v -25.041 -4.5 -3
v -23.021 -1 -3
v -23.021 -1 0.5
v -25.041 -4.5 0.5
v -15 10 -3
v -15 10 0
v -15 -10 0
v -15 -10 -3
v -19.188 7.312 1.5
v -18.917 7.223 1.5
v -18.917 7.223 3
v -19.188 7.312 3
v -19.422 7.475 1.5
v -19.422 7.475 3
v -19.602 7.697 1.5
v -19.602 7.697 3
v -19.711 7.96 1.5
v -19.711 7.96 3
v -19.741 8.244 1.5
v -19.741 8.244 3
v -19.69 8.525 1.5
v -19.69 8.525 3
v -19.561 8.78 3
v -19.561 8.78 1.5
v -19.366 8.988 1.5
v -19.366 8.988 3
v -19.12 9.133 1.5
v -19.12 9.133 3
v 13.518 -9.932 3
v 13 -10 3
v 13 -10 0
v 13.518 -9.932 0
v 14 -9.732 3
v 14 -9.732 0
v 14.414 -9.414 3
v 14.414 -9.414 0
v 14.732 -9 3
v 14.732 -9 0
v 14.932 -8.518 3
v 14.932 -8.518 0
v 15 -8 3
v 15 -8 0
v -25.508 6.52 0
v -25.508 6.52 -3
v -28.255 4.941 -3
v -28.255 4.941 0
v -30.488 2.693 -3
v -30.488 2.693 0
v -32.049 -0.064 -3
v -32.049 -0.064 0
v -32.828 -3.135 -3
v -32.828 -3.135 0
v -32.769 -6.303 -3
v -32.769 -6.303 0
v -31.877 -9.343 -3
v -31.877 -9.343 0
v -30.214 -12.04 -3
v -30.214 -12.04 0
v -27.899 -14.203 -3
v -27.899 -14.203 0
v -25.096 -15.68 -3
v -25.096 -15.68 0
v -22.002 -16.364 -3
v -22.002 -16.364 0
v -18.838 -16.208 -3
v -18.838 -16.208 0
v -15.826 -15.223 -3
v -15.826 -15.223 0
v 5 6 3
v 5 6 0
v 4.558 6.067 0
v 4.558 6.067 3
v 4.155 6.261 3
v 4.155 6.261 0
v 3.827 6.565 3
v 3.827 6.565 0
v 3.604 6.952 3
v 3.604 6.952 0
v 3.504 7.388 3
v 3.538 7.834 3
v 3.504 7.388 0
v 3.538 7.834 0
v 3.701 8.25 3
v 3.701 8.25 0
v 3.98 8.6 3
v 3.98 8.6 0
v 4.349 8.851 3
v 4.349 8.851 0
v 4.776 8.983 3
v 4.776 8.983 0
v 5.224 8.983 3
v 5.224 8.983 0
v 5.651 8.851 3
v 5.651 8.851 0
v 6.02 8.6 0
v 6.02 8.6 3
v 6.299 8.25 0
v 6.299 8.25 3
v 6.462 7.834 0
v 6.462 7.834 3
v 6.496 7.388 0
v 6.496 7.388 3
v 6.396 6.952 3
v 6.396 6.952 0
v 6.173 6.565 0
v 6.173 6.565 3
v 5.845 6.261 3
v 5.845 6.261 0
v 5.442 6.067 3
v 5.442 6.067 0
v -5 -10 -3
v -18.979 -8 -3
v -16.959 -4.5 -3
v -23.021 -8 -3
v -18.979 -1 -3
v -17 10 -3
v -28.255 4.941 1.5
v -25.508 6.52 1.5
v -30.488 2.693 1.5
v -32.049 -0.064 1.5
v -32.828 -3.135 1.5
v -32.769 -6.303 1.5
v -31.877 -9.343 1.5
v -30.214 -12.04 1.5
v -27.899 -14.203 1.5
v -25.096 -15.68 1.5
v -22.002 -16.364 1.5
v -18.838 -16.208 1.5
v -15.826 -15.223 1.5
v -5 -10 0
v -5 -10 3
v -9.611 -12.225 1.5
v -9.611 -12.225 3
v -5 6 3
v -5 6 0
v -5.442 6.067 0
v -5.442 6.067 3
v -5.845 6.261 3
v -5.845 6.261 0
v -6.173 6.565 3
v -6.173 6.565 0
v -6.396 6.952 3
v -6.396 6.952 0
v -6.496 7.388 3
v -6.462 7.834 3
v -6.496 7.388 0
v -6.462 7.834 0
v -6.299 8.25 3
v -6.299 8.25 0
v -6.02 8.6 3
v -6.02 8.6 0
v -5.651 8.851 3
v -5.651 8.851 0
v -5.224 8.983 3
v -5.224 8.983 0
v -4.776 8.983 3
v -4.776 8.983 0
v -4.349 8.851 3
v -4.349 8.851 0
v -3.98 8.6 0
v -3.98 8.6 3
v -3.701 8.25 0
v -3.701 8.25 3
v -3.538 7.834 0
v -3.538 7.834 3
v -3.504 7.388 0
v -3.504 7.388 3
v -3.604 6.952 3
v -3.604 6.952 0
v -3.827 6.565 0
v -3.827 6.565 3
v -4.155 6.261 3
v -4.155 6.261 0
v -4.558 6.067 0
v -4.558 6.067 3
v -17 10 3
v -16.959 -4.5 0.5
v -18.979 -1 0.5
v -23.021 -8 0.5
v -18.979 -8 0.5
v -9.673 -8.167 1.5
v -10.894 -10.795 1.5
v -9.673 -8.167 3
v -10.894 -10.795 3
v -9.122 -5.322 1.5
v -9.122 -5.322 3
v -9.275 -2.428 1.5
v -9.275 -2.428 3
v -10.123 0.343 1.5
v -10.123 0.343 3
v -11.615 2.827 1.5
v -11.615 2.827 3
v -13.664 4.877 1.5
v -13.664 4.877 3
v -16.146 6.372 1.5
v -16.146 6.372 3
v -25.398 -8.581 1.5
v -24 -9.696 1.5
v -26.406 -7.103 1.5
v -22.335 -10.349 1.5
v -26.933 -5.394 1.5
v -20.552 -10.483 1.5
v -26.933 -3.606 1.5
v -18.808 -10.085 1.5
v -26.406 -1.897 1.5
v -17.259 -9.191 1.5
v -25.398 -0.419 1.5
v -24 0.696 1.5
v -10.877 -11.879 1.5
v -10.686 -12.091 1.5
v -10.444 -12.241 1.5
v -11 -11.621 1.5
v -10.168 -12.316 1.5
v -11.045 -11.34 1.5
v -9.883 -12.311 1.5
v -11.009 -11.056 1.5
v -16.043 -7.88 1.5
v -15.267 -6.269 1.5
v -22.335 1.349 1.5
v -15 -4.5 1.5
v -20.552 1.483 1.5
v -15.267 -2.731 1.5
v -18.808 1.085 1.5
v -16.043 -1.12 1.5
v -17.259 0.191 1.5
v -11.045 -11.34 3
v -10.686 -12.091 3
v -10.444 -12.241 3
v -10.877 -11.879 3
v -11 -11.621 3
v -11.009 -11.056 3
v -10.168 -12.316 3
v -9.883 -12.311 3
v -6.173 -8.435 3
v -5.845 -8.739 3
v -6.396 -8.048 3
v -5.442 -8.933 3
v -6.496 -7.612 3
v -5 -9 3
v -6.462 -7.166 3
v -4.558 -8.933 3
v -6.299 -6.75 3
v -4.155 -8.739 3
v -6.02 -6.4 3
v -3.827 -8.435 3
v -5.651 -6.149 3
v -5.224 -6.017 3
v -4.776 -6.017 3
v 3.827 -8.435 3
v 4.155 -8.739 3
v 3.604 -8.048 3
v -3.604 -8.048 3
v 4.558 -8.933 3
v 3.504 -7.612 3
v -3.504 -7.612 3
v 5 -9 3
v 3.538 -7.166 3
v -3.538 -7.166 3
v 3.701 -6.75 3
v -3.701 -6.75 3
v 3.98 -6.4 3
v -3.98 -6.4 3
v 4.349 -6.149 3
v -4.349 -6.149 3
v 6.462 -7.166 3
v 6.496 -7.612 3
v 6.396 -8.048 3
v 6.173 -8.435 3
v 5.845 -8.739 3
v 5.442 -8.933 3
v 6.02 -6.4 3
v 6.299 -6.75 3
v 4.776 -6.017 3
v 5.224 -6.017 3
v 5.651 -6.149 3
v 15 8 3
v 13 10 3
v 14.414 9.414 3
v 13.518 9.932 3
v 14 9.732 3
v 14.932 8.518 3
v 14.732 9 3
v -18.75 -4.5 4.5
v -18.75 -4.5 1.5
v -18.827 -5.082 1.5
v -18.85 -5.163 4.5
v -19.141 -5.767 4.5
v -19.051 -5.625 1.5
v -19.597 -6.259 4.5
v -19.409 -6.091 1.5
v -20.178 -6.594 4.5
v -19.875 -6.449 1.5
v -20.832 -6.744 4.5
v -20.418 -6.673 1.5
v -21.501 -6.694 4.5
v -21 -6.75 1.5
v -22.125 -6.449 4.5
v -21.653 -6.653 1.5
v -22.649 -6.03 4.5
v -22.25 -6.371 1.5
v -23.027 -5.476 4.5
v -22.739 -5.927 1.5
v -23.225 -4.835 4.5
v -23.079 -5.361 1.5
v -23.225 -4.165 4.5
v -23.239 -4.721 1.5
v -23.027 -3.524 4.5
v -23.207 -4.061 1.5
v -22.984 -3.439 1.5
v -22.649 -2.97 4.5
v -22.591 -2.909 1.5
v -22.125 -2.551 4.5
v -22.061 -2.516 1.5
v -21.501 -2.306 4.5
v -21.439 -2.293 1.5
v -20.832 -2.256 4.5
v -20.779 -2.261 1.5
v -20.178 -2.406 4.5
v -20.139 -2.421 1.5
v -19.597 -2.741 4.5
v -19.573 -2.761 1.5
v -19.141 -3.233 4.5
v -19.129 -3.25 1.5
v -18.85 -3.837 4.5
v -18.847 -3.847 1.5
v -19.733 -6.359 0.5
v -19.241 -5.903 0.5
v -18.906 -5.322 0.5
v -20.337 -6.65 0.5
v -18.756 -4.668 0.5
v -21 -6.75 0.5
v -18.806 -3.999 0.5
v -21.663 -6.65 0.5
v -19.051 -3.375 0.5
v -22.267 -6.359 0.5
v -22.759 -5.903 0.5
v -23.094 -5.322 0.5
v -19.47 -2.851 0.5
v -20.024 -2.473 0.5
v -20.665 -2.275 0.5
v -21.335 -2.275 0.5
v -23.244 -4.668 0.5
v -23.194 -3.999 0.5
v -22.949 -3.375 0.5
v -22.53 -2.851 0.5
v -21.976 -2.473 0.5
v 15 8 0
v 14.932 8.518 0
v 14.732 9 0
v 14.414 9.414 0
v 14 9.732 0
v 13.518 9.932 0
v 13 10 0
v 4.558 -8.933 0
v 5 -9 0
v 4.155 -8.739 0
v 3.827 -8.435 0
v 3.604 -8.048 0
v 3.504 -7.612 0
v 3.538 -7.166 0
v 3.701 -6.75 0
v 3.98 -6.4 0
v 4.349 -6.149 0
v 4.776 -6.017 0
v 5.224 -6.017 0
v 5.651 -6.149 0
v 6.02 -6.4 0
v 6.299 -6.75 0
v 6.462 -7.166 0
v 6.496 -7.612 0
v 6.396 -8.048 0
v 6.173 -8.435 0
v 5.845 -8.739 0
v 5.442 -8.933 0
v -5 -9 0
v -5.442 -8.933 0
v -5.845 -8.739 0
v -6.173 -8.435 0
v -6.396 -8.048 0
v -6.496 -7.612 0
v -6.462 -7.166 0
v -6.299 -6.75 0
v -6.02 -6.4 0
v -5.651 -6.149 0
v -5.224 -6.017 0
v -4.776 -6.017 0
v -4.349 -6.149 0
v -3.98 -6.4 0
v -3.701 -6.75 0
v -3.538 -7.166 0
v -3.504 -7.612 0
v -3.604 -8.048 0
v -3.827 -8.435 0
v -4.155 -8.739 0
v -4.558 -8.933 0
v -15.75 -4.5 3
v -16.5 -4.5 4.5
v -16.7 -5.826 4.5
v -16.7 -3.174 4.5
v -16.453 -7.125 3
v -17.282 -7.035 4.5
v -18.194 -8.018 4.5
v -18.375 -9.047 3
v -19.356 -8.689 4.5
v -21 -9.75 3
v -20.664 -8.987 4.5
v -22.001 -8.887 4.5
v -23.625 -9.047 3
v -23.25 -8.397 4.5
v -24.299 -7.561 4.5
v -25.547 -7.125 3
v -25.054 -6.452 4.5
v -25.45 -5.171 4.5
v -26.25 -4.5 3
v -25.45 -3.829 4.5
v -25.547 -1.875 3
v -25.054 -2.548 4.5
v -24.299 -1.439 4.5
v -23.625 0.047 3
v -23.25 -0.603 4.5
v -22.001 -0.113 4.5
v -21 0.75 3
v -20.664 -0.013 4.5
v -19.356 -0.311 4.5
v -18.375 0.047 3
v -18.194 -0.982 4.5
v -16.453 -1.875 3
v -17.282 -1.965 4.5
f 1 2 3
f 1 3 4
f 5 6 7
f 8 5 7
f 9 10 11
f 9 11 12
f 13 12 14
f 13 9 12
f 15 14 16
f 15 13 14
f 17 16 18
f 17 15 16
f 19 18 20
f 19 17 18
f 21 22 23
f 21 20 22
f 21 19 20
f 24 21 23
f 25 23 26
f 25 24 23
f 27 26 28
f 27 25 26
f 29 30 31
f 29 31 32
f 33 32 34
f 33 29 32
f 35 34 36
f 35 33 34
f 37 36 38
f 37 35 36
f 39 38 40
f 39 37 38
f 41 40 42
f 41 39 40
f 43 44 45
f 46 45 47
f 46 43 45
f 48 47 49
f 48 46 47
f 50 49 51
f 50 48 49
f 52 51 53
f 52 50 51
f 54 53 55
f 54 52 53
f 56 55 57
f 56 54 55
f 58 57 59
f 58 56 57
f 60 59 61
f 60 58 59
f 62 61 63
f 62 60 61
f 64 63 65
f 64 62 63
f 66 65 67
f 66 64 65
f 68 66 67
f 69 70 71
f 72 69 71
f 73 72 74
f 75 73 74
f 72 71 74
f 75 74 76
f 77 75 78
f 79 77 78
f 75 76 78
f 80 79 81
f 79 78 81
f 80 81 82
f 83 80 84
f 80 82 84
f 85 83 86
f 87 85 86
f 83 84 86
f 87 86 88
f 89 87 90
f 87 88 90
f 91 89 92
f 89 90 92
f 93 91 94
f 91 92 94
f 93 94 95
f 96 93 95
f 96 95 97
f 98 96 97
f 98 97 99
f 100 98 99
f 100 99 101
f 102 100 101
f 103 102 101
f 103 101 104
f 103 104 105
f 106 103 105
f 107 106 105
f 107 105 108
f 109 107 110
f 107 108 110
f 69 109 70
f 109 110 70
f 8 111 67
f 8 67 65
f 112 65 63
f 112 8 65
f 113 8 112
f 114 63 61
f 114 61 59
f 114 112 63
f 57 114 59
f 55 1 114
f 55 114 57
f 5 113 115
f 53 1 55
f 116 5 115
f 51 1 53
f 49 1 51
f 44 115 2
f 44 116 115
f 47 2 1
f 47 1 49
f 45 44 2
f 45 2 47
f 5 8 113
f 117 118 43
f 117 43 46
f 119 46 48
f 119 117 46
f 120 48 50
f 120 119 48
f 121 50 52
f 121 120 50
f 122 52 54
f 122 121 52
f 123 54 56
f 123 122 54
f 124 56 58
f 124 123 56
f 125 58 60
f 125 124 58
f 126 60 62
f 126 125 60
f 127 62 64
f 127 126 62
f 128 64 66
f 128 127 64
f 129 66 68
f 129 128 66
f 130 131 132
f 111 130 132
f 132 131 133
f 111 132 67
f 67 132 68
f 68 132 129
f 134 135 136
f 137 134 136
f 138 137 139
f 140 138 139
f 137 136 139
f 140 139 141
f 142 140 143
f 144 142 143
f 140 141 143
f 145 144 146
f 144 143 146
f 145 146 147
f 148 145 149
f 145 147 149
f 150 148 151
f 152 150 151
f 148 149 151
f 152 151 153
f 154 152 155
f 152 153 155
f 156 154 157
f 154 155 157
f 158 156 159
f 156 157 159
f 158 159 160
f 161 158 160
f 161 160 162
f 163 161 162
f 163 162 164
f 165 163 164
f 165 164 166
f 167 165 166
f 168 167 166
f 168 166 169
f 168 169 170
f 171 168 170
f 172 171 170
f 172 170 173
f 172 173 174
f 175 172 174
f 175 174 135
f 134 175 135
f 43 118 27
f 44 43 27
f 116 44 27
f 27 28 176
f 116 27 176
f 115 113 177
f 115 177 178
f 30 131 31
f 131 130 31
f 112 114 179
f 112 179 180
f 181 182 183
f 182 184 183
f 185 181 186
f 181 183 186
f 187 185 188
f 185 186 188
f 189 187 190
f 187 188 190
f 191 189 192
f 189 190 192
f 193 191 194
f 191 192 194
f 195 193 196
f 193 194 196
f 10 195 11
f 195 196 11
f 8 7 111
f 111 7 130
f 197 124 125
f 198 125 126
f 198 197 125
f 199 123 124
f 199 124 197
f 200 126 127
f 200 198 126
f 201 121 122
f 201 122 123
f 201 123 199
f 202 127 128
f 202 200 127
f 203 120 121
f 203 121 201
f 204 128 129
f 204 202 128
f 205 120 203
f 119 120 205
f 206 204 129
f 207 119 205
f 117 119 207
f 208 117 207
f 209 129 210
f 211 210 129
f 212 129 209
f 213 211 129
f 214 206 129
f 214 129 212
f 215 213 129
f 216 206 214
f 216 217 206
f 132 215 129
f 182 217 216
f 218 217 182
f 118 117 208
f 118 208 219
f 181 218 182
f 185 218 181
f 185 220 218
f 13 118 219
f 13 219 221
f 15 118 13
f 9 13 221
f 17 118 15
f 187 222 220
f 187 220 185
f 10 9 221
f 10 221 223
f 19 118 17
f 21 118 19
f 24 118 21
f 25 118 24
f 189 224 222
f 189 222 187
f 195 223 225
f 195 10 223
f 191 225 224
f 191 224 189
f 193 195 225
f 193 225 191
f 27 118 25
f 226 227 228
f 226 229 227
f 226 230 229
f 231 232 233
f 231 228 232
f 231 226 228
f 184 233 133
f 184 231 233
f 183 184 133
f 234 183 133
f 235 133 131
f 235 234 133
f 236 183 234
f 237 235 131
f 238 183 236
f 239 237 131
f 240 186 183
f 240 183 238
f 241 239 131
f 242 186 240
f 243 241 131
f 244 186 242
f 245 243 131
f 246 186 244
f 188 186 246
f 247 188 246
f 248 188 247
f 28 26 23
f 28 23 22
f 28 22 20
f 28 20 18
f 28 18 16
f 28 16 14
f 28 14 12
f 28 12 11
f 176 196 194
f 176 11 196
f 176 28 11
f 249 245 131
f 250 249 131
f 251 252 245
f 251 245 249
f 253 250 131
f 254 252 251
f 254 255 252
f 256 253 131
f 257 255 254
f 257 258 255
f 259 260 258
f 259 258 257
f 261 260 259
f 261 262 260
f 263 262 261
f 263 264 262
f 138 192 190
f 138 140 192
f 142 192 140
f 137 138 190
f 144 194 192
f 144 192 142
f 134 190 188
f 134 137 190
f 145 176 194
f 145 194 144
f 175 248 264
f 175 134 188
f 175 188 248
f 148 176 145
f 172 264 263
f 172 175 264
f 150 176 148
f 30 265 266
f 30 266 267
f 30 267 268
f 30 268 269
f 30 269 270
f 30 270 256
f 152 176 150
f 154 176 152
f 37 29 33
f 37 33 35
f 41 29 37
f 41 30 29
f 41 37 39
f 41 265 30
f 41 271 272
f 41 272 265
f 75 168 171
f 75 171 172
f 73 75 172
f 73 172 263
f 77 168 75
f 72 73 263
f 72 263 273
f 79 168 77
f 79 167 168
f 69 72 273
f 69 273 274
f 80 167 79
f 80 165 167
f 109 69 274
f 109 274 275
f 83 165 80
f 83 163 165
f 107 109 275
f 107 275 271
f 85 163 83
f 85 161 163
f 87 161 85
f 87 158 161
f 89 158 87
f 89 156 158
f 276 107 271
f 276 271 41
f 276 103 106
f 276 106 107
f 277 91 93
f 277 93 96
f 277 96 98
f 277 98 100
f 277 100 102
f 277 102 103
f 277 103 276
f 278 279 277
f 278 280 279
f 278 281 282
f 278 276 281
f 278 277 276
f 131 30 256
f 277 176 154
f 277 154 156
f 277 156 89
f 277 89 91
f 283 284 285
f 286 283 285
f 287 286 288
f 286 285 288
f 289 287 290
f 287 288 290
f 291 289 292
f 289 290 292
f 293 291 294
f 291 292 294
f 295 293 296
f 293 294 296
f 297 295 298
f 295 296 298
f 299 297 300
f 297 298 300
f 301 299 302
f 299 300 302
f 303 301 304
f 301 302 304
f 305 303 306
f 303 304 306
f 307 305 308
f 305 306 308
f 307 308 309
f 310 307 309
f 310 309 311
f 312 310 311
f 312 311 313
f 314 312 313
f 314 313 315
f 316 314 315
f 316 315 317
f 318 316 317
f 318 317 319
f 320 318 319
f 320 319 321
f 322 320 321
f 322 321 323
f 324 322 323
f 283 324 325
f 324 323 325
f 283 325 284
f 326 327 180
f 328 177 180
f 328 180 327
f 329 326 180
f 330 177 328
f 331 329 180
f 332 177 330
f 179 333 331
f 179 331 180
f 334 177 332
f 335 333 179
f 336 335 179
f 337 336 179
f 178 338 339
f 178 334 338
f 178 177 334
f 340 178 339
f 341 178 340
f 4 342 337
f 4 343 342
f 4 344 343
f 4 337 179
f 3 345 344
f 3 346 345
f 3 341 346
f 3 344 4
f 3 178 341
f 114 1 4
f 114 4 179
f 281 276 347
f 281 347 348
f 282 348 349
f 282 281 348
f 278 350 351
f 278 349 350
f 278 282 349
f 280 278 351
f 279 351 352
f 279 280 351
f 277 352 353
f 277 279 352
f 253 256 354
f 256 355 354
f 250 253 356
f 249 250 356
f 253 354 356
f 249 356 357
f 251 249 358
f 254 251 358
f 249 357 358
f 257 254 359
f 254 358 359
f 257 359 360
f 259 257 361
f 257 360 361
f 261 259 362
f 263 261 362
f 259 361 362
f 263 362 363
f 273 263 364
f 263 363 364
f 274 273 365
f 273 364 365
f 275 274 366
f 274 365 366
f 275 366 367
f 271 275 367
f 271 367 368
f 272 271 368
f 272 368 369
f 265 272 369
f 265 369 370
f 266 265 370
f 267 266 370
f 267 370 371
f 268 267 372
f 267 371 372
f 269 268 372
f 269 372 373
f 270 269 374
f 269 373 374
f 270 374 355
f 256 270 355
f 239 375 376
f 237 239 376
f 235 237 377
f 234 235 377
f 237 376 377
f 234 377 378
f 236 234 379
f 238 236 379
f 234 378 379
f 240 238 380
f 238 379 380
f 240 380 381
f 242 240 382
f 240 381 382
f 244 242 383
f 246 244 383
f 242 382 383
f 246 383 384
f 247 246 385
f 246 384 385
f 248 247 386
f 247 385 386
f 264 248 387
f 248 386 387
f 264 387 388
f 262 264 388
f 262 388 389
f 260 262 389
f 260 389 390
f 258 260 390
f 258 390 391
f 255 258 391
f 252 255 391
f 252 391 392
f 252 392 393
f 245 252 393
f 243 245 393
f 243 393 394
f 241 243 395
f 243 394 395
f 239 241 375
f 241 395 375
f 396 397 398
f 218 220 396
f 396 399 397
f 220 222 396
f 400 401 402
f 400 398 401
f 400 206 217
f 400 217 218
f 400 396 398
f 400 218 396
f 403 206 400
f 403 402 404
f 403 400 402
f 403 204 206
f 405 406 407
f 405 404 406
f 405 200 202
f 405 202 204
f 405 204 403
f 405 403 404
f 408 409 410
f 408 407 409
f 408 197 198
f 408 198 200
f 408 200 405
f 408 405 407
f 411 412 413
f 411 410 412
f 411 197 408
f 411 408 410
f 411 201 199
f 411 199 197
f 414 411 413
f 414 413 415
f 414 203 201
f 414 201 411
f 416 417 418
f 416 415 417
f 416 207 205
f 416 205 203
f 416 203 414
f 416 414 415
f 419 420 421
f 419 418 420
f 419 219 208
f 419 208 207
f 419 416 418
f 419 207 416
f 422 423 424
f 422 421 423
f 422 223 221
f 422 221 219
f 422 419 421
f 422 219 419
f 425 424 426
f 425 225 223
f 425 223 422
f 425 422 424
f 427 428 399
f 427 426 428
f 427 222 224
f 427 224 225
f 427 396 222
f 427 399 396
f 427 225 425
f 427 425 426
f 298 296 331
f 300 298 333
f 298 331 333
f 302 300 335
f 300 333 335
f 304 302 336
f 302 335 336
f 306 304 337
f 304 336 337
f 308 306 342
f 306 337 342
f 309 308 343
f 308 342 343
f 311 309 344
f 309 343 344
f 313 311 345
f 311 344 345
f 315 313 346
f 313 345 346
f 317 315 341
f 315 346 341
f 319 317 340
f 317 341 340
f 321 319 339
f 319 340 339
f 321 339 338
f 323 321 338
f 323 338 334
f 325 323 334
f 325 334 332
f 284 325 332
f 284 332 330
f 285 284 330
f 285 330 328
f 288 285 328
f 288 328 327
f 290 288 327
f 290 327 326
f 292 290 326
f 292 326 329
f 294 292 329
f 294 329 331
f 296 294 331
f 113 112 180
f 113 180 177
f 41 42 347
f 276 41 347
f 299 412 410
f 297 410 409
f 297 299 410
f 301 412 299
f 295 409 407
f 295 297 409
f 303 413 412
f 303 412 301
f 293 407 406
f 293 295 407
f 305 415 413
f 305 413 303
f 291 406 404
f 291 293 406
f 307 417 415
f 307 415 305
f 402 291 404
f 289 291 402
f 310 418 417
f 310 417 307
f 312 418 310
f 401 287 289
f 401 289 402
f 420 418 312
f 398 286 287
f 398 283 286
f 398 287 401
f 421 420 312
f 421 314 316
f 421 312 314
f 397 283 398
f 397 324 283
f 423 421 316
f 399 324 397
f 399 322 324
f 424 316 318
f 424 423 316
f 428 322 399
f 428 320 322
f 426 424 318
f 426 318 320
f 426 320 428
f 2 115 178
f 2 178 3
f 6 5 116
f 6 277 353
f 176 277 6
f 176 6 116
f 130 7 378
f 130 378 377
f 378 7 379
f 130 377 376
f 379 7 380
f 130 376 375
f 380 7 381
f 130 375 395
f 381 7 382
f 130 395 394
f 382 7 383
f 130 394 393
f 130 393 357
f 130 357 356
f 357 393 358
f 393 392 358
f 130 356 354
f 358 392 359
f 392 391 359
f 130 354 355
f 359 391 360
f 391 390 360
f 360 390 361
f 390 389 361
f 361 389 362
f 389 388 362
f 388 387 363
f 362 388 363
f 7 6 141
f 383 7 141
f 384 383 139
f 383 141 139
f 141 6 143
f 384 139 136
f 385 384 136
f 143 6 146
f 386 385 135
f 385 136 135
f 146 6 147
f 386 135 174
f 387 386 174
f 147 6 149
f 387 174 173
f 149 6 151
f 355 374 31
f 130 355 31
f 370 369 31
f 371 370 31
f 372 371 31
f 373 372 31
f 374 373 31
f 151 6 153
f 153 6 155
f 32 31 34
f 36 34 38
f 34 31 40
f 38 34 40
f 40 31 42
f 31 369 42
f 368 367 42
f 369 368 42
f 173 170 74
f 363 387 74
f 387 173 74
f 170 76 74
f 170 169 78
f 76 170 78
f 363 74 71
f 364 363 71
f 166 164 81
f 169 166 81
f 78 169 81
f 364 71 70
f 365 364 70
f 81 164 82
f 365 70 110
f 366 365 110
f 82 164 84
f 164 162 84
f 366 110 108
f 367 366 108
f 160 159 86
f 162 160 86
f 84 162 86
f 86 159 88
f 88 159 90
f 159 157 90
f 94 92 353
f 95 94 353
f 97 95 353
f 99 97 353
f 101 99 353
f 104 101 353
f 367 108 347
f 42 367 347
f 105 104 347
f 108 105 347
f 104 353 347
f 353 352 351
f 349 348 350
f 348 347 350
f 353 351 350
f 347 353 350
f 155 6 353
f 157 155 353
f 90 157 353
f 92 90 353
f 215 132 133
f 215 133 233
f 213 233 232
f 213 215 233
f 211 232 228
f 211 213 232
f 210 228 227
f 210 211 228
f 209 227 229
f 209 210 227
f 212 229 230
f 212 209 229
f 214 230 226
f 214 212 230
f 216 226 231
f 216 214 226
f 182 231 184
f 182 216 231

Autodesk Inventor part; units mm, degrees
ref_plane "YZ Plane" through (0, 0, 0) normal (1, 0, 0) x (0, 1, 0)
ref_plane "XZ Plane" through (0, 0, 0) normal (0, 1, 0) x (-1, 0, 0)
sketch "Sketch1" plane through (0, 0, 0) normal (0, 0, 1) x (1, 0, 0)
  line L0 (-15, -10) -> (15, -10)
  line L1 (15, -10) -> (15, 10)
  line L2 (15, 10) -> (-15, 10)
  line L3 (-15, 10) -> (-15, -10)
  line L4 (-15, -10) -> (15, 10) construction
  line L5 (15, -10) -> (-15, 10) construction
  point P0 (0, 0)
  dimension "d0" = 30
  dimension "d1" = 20
extrude "Extrusion1" add sketch "Sketch1" along normal blind 3
sketch "Sketch2" plane through (0, 0, 3) normal (0, 0, 1) x (1, 0, 0)
  line L0 (-5, -7.5) -> (5, -7.5)
  line L1 (5, -7.5) -> (5, 7.5)
  line L2 (5, 7.5) -> (-5, 7.5)
  line L3 (-5, 7.5) -> (-5, -7.5)
  line L4 (-5, -7.5) -> (5, 7.5) construction
  line L5 (5, -7.5) -> (-5, 7.5) construction
  point P0 (0, 0)
  point P1 (0, 0)
  dimension "d4" = 10
  dimension "d5" = 15
hole "Hole1" at (-5, 7.5, 3) at (5, 7.5, 3) at (-5, -7.5, 3) at (5, -7.5, 3) direction (0, 0, -1) diameter 3 end through all
sketch "Sketch3" plane through (0, 0, 3) normal (0, 0, 1) x (1, 0, 0)
  line L0 (-18.979274, -1) -> (-16.958548, -4.5)
  line L1 (-16.958548, -4.5) -> (-18.979274, -8)
  line L2 (-18.979274, -8) -> (-23.020726, -8)
  line L3 (-23.020726, -8) -> (-25.041452, -4.5)
  line L4 (-25.041452, -4.5) -> (-23.020726, -1)
  line L5 (-23.020726, -1) -> (-18.979274, -1)
  circle A0 centre (-21, -4.5) radius 11.90625
  line L6 (15, -10) -> (15, 10)
  line L7 (15, 10) -> (-15, 10)
  line L8 (-15, 10) -> (-15, -10)
  line L9 (-15, -10) -> (15, -10)
  line L10 (-100, -4.5) -> (100, -4.5) construction
  line L11 (100, -4.5) -> (100, 4.5) construction
  line L12 (100, 4.5) -> (-100, 4.5) construction
  line L13 (-100, 4.5) -> (-100, -4.5) construction
  line L14 (-100, -4.5) -> (100, 4.5) construction
  line L15 (100, -4.5) -> (-100, 4.5) construction
  line L16 (-15, 10) -> (-17, 10)
  line L17 (-17, 10) -> (-25.507677, 6.519965)
  line L18 (15, -10) -> (15, -12)
  line L19 (15, -12) -> (-19.52358, -16.314354)
  line L20 (-22.587713, -1.75) -> (-19.412287, -1.75) construction
  line L21 (-19.412287, -1.75) -> (-17.824574, -4.5) construction
  line L22 (-17.824574, -4.5) -> (-19.412287, -7.25) construction
  line L23 (-19.412287, -7.25) -> (-22.587713, -7.25) construction
  line L24 (-22.587713, -7.25) -> (-24.175426, -4.5) construction
  line L25 (-24.175426, -4.5) -> (-22.587713, -1.75) construction
  circle A1 centre (-21, -4.5) radius 2 construction
  circle A2 centre (-21, -4.5) radius 1.5 construction
  line L26 (-5, -10) -> (-15.826239, -15.223385)
  point P0 (0, 0)
  point P1 (-21, -1)
  point P2 (-17.377304, -15.841731)
  point P3 (-10.440228, -10)
  point P4 (-15, 5.783909)
  point P5 (15, -11)
  dimension "d13" = 7
  dimension "d14" = 23.8125
  dimension "d15" = 9
  dimension "d16" = 200
  dimension "d19" = 4.5
  dimension "d30" = 21
  dimension "d44" = 2
  dimension "d46" = 5.5
  dimension "d47" = 4
  dimension "d48" = 0
  dimension "d49" = 3
  dimension "d73" = 20
extrude "Extrusion2" add sketch "Sketch3" against normal up to surface (3 mm away) contours L0 L1 L2 L3 L4 L5 | A0 L8 L9 | L17 L16 L8 A0 | A0 L9 L8 | A0 L9 L26
sketch "Sketch4" plane through (0, 0, 0) normal (0, 0, -1) x (-1, 0, 0)
  line L0 (-15, -10) -> (-15, 10)
  arc A0 (15.826239, -15.223385) -> (25.507677, 6.519965) centre (21, -4.5) ccw
  line L1 (-15, 10) -> (17, 10)
  line L2 (15, -10) -> (-15, -10)
  line L3 (-15, -10) -> (-15, 10)
  line L4 (-15, 10) -> (15, 10)
  line L5 (15, 10) -> (15, -10)
  line L6 (15, -10) -> (-15, 10) construction
  line L7 (-15, -10) -> (15, 10) construction
  line L8 (25.507677, 6.519965) -> (17, 10)
  line L9 (5, -10) -> (15.826239, -15.223385)
  line L10 (5, -10) -> (-15, -10)
  point P0 (0, 0)
  point P1 (15, 1.283909)
  point P2 (9.135819, -10)
extrude "Extrusion3" add sketch "Sketch4" along normal blind 3 contours L2 L5 L1 L8 A0 L9
sketch "Sketch5" plane through (0, 0, -3) normal (0, 0, -1) x (-1, 0, 0)
  arc A0 (15.826239, -15.223385) -> (25.507677, 6.519965) centre (21, -4.5) ccw
  line L0 (15, -10) -> (5, -10)
  line L1 (15, -5) -> (32.895747, -5)
  line L2 (100, -4.5) -> (-100, -4.5) construction
  line L3 (17, 10) -> (15, 10)
  line L4 (25.507677, 6.519965) -> (17, 10)
  line L5 (5, -10) -> (15.826239, -15.223385)
  line L6 (15, 10) -> (15, -10)
  point P0 (0, 0)
  dimension "d25" = 0.5
extrude "Extrusion4" add sketch "Sketch5" along normal blind 6
extrude "Extrusion5" cut sketch "Sketch3" against normal blind 1.5 contours L0 L1 L2 L3 L4 L5 | A0 L8 L9 | A0 L9 L8
fillet "Fillet1" radius 1 2 edges at (-25.5077, 6.52, 2.25) (-15.8262, -15.2234, 2.25)
sketch "Sketch6" plane through (0, 0, 1.5) normal (0, 0, 1) x (1, 0, 0)
  arc A0 (-25.507677, 6.519965) -> (-15.826239, -15.223385) centre (-21, -4.5) ccw
  arc A1 (-10.894095, -10.795194) -> (-18.916677, 7.222566) centre (-21, -4.5) ccw
  arc A2 (-19.120298, 9.1327) -> (-18.916677, 7.222566) centre (-18.7417, 8.207139) ccw
  line L0 (-19.120298, 9.1327) -> (-25.507677, 6.519965)
  line L1 (-15.826239, -15.223385) -> (-9.610763, -12.224576)
  arc A3 (-10.894095, -10.795194) -> (-9.610763, -12.224576) centre (-10.045305, -11.323924) ccw
  point P0 (0, 0)
hole "Hole2" at (-21, -4.5, 1.5) direction (0, 0, -1) diameter 4.5 depth 4
sketch "Sketch7" plane through (0, 0, -9) normal (0, 0, -1) x (-1, 0, 0)
  arc A0 (15.826239, -15.223385) -> (25.507677, 6.519965) centre (21, -4.5) ccw
  line L0 (15, -10) -> (5, -10)
  line L1 (18.979274, -1) -> (23.020726, -1)
  line L2 (23.020726, -1) -> (25.041452, -4.5)
  line L3 (25.041452, -4.5) -> (23.020726, -8)
  line L4 (23.020726, -8) -> (18.979274, -8)
  line L5 (18.979274, -8) -> (16.958548, -4.5)
  line L6 (16.958548, -4.5) -> (18.979274, -1)
  line L7 (25.507677, 6.519965) -> (17, 10)
  line L8 (17, 10) -> (15, 10)
  line L9 (5, -10) -> (15.826239, -15.223385)
  line L10 (15, 10) -> (15, -10)
  point P0 (0, 0)
  point P1 (21, -8)
  dimension "d39" = 7
extrude "Extrusion6" cut sketch "Sketch7" against normal blind 4 contours L9 L0 L10 L8 L7 A0 | L1 L2 L3 L4 L5 L6
sketch "Sketch9" plane through (0, 0, -5) normal (0, 0, -1) x (-1, 0, 0)
  arc A0 (15.826239, -15.223385) -> (25.507677, 6.519965) centre (21, -4.5) ccw
  circle A1 centre (21, -7) radius 6
  line L0 (27, -7) -> (27, -5)
  line L1 (15, -7) -> (15, -5)
  line L2 (15, -10) -> (15.803848, -10)
  line L3 (15, 10) -> (17, 10)
  line L4 (15.826239, -15.223385) -> (5, -10)
  line L5 (17, 10) -> (25.507677, 6.519965)
  line L6 (15, -10) -> (15, 10)
  line L7 (5, -10) -> (15, -10)
  point P0 (0, 0)
  dimension "d52" = 12
extrude "Extrusion8" [suppressed]
chamfer "Chamfer1" [suppressed]
sketch "Sketch11" plane through (0, 0, 1.5) normal (0, 0, 1) x (1, 0, 0)
  circle A0 centre (-21, -4.5) radius 2.25
  arc A1 (-25.507677, 6.519965) -> (-15.826239, -15.223385) centre (-21, -4.5) ccw
  arc A2 (-10.894095, -10.795194) -> (-18.916677, 7.222566) centre (-21, -4.5) ccw
  arc A3 (-19.120298, 9.1327) -> (-18.916677, 7.222566) centre (-18.7417, 8.207139) ccw
  line L0 (-19.120298, 9.1327) -> (-25.507677, 6.519965)
  circle A4 centre (-21, -4.5) radius 4.5
  line L1 (-15.826239, -15.223385) -> (-9.610763, -12.224576)
  arc A5 (-10.894095, -10.795194) -> (-9.610763, -12.224576) centre (-10.045305, -11.323924) ccw
  point P0 (0, 0)
  dimension "d61" = 9
extrude "Extrusion10" add sketch "Sketch11" along normal blind 3 contours A4
chamfer "Chamfer2" distance 1.5 distance2 3 1 edges at (-25.5, -4.5, 1.5) measured on face at (-15.1038, -11.5542, 1.5)
sketch "Sketch12" plane through (0, 0, -5) normal (0, 0, -1) x (-1, 0, 0)
  circle A0 centre (21, -4.5) radius 4.5
  line L0 (23.020726, -8) -> (18.979274, -8)
  line L1 (18.979274, -8) -> (16.958548, -4.5)
  line L2 (16.958548, -4.5) -> (18.979274, -1)
  line L3 (18.979274, -1) -> (23.020726, -1)
  line L4 (23.020726, -1) -> (25.041452, -4.5)
  line L5 (25.041452, -4.5) -> (23.020726, -8)
  point P0 (0, 0)
  point P1 (21, -8)
  dimension "d67" = 7
extrude "Extrusion11" cut sketch "Sketch12" against normal blind 5.5 contours L0 L1 L2 L3 L4 L5
sketch "Sketch13" plane through (0, 0, -5) normal (0, 0, -1) x (-1, 0, 0)
  line L0 (25.041452, -4.5) -> (23.020726, -8)
  line L1 (23.020726, -8) -> (18.979274, -8)
  line L2 (18.979274, -8) -> (16.958548, -4.5)
  arc A0 (15.826239, -15.223385) -> (25.507677, 6.519965) centre (21, -4.5) ccw
  line L3 (25.041452, -7) -> (25.041452, -5)
  line L4 (16.958548, -7) -> (16.958548, -5)
  line L5 (18.979274, -1) -> (23.020726, -1)
  line L6 (23.020726, -1) -> (25.041452, -4.5)
  line L7 (16.958548, -4.5) -> (18.979274, -1)
  line L8 (15, 10) -> (17, 10)
  line L9 (15.826239, -15.223385) -> (5, -10)
  line L10 (17, 10) -> (25.507677, 6.519965)
  line L11 (15, -10) -> (15, 10)
  line L12 (5, -10) -> (15, -10)
  point P0 (0, 0)
extrude "Extrusion12" cut sketch "Sketch13" against normal up to surface (2 mm away)
ref_plane "Work Plane1" through (0, 0, 1.35) normal (0, 0, 1) x (1, 0, 0)
fillet "Fillet4" radius 2 2 edges at (15, -10, 1.5) (15, 10, 1.5)
properties part number "UpperCarriagePivotMount" material "ABS Plastic"
